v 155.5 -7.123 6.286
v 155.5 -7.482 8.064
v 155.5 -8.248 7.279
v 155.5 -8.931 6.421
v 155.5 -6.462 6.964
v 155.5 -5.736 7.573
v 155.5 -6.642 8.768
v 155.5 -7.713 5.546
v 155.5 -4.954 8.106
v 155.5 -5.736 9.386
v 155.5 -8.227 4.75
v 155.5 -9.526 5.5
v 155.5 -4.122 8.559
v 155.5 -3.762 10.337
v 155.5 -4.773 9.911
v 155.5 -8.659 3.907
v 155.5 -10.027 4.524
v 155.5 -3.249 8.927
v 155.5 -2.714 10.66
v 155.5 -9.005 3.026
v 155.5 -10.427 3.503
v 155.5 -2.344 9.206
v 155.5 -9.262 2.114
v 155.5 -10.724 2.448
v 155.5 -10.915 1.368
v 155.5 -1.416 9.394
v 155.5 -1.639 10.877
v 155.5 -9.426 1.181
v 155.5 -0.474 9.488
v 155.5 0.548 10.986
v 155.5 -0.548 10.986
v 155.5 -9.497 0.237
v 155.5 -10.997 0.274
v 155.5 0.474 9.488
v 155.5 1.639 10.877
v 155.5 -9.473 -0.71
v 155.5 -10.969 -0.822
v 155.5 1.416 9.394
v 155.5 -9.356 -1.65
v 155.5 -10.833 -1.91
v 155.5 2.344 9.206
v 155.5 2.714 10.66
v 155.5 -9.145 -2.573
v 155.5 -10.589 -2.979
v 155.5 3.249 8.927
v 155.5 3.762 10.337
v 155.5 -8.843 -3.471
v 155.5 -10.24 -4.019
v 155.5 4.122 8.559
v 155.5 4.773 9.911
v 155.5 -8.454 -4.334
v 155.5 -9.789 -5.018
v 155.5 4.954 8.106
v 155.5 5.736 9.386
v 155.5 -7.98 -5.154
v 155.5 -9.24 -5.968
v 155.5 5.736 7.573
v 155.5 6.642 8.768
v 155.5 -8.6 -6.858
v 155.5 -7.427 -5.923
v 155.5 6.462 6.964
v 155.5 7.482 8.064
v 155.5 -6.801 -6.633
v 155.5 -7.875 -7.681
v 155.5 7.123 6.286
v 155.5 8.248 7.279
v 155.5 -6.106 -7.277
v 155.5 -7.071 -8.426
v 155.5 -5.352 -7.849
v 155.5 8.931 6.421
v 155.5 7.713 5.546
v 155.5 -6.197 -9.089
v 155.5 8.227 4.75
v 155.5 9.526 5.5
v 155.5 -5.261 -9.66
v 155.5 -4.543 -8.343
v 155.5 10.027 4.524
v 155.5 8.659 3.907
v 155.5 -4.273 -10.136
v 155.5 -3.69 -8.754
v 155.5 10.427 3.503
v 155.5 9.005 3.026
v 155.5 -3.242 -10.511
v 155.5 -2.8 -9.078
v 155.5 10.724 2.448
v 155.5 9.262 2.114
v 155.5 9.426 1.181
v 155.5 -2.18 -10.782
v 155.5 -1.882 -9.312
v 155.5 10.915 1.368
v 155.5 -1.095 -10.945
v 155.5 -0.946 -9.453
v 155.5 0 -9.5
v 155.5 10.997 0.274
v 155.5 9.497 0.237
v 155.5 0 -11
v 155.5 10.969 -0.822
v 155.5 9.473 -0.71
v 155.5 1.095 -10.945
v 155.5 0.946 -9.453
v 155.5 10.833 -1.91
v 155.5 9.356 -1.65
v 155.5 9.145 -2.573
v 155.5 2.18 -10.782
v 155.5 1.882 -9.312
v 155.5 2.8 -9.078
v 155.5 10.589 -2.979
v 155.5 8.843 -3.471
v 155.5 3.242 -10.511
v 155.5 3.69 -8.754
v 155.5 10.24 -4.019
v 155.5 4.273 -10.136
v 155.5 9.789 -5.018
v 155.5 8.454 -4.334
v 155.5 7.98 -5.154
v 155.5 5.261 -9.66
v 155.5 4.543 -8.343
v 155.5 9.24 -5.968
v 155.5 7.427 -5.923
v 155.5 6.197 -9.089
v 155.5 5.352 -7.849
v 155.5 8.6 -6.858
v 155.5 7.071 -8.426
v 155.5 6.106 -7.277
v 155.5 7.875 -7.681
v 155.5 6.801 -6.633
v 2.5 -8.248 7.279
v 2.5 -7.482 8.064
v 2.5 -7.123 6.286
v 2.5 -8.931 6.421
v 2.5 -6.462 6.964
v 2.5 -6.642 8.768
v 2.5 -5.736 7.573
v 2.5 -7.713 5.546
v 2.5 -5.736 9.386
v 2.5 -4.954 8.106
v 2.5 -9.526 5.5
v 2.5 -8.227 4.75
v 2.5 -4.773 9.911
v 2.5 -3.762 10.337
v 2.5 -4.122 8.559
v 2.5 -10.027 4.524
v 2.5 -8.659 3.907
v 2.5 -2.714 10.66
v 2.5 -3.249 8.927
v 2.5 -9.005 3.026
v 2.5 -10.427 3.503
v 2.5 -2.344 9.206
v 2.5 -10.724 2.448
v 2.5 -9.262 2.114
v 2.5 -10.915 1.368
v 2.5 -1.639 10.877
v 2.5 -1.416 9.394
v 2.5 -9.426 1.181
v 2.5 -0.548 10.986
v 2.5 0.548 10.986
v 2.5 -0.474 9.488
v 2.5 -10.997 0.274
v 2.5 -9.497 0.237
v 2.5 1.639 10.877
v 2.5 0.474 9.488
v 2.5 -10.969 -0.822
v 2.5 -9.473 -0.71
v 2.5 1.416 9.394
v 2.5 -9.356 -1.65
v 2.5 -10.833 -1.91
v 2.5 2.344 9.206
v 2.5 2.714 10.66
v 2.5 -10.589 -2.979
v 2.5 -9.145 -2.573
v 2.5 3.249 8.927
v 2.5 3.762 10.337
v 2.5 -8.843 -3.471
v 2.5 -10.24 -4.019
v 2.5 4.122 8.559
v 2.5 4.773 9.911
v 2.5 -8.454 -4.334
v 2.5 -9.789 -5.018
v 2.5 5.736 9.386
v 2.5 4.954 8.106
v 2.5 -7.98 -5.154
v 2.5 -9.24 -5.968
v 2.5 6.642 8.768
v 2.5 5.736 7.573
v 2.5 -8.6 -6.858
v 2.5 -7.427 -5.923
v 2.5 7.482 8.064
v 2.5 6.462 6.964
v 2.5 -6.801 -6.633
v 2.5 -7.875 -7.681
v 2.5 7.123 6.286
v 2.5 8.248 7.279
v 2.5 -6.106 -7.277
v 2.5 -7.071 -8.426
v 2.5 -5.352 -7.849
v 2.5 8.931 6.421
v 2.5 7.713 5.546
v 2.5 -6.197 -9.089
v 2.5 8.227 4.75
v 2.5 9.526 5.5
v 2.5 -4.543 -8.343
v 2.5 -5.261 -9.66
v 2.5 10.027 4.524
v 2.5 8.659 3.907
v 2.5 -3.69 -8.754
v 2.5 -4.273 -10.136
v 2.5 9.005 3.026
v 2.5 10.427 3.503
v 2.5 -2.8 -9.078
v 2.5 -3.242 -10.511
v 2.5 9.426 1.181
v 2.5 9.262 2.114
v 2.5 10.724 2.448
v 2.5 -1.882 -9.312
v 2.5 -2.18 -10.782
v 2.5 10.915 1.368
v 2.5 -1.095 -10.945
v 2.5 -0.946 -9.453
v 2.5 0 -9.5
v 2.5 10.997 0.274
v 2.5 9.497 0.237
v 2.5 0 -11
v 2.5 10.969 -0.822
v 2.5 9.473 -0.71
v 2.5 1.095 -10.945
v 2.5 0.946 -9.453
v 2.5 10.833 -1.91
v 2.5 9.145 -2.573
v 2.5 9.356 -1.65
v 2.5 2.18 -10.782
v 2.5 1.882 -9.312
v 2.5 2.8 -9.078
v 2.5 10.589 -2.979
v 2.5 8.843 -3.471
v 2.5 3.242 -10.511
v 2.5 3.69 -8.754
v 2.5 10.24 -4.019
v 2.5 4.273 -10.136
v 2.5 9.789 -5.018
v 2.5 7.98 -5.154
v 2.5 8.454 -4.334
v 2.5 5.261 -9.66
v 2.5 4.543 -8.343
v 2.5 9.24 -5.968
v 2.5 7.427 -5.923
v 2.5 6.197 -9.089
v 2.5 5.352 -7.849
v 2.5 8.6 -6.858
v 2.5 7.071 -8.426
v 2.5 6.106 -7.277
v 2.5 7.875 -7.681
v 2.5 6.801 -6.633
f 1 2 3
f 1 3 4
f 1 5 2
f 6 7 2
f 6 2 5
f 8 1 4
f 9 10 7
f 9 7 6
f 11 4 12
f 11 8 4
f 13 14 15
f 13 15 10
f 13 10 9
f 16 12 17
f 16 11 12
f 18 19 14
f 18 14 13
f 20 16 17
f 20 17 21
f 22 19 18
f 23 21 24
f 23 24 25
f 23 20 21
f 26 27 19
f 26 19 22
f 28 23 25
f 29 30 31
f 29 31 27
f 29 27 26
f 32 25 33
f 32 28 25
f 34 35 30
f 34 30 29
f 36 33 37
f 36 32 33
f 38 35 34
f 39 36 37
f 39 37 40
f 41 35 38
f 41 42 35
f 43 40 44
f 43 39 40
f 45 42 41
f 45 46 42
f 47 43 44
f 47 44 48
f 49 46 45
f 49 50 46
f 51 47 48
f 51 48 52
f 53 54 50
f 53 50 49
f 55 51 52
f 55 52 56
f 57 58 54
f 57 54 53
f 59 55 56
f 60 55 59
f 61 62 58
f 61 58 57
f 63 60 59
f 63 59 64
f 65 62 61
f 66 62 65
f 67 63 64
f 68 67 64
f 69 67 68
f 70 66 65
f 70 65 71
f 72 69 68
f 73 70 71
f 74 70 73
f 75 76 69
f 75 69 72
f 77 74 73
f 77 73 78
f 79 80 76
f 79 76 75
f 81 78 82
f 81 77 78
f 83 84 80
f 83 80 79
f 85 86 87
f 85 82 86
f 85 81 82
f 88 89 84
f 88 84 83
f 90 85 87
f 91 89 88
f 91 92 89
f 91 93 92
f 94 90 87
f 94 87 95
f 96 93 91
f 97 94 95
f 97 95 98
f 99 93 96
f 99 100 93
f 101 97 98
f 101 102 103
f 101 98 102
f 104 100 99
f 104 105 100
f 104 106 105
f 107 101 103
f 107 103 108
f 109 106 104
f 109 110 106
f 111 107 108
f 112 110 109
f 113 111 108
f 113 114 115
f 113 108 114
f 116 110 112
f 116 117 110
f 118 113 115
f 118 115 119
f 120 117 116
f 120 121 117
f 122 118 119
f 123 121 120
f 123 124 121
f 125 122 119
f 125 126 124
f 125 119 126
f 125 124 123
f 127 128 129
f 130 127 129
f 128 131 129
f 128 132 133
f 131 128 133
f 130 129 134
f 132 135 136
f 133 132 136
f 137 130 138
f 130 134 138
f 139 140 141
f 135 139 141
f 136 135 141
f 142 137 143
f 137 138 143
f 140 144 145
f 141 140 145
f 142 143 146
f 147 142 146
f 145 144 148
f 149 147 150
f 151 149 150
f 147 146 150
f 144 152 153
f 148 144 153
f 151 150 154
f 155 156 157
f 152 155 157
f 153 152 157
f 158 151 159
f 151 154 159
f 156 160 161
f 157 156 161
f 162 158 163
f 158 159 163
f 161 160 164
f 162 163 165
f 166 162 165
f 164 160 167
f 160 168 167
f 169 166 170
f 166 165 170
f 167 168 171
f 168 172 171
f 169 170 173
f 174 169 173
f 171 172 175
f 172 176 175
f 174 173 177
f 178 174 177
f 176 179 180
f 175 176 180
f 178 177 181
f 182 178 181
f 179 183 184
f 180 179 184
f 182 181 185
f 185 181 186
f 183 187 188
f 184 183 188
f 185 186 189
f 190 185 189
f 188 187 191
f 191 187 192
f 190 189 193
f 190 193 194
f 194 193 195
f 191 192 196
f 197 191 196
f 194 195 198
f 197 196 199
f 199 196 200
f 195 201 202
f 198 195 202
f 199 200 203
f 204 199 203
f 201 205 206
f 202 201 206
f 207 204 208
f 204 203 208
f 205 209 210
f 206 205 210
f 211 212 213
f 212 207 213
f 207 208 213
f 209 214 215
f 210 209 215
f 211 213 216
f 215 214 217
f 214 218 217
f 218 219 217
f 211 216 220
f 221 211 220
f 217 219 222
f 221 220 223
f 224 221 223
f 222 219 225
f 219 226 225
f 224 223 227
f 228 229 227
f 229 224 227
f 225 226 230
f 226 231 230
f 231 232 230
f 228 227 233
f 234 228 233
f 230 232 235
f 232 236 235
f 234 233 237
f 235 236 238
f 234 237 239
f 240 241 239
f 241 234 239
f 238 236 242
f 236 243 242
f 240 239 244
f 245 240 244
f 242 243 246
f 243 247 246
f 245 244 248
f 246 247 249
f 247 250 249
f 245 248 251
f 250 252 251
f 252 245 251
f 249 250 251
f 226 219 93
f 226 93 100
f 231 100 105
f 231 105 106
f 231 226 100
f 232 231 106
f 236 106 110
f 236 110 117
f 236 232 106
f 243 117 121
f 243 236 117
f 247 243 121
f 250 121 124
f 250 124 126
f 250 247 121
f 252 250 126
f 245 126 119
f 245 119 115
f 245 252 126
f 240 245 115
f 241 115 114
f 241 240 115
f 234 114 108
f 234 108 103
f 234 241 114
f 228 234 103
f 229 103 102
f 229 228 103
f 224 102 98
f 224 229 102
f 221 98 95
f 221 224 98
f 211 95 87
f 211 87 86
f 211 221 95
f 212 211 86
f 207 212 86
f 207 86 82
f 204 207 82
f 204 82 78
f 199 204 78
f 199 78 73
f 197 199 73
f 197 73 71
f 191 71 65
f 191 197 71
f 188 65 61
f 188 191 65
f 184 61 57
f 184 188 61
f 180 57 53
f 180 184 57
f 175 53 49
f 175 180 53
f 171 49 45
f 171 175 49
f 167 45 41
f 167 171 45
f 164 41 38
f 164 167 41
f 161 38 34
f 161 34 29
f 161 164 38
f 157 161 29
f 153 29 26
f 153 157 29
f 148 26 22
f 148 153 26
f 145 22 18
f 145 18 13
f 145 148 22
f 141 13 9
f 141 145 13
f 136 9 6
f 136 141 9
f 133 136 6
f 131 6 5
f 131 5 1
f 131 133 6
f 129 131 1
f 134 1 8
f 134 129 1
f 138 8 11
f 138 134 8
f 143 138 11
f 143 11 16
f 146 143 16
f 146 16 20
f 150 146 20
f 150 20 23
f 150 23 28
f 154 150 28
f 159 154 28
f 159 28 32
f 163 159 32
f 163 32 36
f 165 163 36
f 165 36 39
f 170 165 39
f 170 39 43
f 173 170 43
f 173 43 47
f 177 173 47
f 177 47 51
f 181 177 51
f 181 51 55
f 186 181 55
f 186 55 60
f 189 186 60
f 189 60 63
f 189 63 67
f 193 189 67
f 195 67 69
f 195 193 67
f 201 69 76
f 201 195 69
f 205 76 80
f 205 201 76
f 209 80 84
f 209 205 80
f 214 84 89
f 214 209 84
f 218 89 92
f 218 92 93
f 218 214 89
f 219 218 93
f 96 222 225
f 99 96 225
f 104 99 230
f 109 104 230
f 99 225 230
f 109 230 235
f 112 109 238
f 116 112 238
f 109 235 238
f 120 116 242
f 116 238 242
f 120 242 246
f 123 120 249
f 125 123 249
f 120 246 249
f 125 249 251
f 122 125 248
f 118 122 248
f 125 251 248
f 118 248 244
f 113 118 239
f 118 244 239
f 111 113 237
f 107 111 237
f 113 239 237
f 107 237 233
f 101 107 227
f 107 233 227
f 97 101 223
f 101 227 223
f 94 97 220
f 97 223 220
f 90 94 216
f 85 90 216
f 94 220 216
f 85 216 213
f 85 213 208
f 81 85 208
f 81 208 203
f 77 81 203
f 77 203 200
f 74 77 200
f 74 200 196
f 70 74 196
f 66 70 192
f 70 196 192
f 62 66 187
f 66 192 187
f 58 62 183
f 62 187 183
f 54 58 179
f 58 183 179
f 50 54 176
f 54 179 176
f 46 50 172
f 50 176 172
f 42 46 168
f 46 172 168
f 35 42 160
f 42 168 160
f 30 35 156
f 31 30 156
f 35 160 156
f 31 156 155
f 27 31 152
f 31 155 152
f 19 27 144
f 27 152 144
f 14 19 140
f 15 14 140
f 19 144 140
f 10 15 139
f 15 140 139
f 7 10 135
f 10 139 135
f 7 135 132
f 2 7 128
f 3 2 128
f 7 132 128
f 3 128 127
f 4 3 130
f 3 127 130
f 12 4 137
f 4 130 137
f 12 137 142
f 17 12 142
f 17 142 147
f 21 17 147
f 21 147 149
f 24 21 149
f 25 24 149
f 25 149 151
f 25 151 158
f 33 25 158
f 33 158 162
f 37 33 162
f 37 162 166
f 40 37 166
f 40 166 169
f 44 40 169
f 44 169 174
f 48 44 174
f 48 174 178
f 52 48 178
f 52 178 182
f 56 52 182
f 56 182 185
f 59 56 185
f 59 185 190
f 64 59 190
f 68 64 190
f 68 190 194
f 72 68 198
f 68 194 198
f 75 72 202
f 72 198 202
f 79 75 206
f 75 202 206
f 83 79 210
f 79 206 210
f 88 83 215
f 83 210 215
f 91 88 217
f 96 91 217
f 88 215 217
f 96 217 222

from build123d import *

# Parameters (mm, degrees)
CYLINDER001_R     = 9.5
CYLINDER001_DEPTH = 153
CYLINDER_R        = 11
CYLINDER_DEPTH    = 153
CUT_PITCH_ANGLE   = 90


with BuildPart() as int:
    # Cylinder001 → Cylinder001 (new body)
    with BuildSketch(Plane.XY.offset(2.5)):
        Circle(CYLINDER001_R)
    extrude(amount=CYLINDER001_DEPTH)


with BuildPart() as steeltube:
    # Cylinder → Cylinder (new body)
    with BuildSketch(Plane.XY.offset(2.5)):
        Circle(CYLINDER_R)
    extrude(amount=CYLINDER_DEPTH)

    # Cut: cut INT
    add(int.part, mode=Mode.SUBTRACT)


with BuildPart() as steeltube_1:
    # Cut pitch: moved
    add(steeltube.part.rotate(Axis((0, 0, 0), (0, 1, 0)), CUT_PITCH_ANGLE))


with BuildPart() as steeltube_2:
    # Cut placement: moved
    add(steeltube_1.part)


solid = steeltube_2.part
